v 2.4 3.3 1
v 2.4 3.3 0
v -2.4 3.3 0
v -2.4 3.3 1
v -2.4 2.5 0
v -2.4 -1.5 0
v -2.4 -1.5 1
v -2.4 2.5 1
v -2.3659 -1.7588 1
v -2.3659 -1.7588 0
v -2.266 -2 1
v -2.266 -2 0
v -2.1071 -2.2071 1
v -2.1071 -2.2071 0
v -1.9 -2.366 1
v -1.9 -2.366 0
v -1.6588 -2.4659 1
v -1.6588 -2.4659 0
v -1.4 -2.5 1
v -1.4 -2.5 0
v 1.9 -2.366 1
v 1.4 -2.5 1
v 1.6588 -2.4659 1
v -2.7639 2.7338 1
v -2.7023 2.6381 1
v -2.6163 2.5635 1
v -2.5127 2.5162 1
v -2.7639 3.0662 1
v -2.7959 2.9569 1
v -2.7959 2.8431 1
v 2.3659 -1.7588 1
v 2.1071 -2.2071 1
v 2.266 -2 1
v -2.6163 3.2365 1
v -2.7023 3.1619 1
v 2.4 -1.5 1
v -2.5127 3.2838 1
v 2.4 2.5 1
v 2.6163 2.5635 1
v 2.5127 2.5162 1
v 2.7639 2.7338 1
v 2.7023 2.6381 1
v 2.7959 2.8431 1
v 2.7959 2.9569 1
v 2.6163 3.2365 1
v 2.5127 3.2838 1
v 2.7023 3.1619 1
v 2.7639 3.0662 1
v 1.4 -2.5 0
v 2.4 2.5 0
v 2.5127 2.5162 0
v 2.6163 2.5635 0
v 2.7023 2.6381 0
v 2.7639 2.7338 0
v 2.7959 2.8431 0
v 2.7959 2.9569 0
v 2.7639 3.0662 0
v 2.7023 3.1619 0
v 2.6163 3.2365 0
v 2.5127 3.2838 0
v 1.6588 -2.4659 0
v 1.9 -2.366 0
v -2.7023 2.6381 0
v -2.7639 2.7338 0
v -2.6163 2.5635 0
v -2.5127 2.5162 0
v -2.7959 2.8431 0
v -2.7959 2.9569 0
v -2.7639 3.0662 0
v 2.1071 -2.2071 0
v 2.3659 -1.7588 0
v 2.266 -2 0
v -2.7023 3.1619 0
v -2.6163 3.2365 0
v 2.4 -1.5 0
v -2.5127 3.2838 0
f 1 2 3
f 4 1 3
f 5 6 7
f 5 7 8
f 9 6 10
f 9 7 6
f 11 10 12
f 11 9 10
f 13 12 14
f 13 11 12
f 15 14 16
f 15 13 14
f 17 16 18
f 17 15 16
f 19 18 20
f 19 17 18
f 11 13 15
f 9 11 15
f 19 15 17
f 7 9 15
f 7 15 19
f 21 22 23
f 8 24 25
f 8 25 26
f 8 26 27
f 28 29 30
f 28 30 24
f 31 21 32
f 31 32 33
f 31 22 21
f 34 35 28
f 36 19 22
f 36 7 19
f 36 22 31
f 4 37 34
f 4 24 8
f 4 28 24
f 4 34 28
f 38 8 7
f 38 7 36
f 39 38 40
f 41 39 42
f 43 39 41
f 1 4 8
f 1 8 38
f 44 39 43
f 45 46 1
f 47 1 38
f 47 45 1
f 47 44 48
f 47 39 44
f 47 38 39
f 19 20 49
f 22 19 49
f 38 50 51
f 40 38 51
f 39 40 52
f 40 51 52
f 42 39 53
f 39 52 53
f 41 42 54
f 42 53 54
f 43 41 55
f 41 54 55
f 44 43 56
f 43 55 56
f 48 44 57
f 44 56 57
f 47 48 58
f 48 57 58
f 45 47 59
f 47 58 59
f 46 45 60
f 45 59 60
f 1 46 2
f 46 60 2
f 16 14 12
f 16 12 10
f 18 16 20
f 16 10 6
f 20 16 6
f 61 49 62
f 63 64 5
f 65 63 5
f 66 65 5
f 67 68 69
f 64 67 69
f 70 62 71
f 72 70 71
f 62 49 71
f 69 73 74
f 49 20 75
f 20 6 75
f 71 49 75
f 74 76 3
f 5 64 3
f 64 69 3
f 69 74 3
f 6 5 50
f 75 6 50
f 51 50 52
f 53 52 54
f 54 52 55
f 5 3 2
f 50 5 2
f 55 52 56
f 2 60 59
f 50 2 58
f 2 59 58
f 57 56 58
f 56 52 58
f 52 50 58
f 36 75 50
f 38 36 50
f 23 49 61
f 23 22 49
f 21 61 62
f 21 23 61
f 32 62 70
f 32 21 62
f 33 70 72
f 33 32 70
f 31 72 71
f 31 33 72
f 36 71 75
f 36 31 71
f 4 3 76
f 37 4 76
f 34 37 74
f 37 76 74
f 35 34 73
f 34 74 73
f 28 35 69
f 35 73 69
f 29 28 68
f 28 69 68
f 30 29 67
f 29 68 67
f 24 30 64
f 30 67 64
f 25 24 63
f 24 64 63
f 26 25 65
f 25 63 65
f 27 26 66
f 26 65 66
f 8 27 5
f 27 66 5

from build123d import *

# Parameters (mm, degrees)
F0_W     = 4.8
F0_H     = 5
F1_DEPTH = 1
F2_R     = 1


with BuildPart() as f1:
    # F0 (on Top) → F1 (new body)
    with BuildSketch(Plane.XY):
        with BuildLine():
            Line((-2.4, 2.5), (2.4, 2.5))
            ThreePointArc((2.4, 2.5), (2.8, 2.9), (2.4, 3.3))
            Line((2.4, 3.3), (0, 3.3))
            Line((0, 3.3), (-2.4, 3.3))
            ThreePointArc((-2.4, 3.3), (-2.8, 2.9), (-2.4, 2.5))
        make_face()
        Rectangle(F0_W, F0_H)
    extrude(amount=F1_DEPTH)

    # F2
    f2_edges = [f1.edges().sort_by_distance(p)[0] for p in [
        (-2.4, -2.5, 0.5),
        (2.4, -2.5, 0.5),
    ]]
    fillet(f2_edges, radius=F2_R)


solid = f1.part
